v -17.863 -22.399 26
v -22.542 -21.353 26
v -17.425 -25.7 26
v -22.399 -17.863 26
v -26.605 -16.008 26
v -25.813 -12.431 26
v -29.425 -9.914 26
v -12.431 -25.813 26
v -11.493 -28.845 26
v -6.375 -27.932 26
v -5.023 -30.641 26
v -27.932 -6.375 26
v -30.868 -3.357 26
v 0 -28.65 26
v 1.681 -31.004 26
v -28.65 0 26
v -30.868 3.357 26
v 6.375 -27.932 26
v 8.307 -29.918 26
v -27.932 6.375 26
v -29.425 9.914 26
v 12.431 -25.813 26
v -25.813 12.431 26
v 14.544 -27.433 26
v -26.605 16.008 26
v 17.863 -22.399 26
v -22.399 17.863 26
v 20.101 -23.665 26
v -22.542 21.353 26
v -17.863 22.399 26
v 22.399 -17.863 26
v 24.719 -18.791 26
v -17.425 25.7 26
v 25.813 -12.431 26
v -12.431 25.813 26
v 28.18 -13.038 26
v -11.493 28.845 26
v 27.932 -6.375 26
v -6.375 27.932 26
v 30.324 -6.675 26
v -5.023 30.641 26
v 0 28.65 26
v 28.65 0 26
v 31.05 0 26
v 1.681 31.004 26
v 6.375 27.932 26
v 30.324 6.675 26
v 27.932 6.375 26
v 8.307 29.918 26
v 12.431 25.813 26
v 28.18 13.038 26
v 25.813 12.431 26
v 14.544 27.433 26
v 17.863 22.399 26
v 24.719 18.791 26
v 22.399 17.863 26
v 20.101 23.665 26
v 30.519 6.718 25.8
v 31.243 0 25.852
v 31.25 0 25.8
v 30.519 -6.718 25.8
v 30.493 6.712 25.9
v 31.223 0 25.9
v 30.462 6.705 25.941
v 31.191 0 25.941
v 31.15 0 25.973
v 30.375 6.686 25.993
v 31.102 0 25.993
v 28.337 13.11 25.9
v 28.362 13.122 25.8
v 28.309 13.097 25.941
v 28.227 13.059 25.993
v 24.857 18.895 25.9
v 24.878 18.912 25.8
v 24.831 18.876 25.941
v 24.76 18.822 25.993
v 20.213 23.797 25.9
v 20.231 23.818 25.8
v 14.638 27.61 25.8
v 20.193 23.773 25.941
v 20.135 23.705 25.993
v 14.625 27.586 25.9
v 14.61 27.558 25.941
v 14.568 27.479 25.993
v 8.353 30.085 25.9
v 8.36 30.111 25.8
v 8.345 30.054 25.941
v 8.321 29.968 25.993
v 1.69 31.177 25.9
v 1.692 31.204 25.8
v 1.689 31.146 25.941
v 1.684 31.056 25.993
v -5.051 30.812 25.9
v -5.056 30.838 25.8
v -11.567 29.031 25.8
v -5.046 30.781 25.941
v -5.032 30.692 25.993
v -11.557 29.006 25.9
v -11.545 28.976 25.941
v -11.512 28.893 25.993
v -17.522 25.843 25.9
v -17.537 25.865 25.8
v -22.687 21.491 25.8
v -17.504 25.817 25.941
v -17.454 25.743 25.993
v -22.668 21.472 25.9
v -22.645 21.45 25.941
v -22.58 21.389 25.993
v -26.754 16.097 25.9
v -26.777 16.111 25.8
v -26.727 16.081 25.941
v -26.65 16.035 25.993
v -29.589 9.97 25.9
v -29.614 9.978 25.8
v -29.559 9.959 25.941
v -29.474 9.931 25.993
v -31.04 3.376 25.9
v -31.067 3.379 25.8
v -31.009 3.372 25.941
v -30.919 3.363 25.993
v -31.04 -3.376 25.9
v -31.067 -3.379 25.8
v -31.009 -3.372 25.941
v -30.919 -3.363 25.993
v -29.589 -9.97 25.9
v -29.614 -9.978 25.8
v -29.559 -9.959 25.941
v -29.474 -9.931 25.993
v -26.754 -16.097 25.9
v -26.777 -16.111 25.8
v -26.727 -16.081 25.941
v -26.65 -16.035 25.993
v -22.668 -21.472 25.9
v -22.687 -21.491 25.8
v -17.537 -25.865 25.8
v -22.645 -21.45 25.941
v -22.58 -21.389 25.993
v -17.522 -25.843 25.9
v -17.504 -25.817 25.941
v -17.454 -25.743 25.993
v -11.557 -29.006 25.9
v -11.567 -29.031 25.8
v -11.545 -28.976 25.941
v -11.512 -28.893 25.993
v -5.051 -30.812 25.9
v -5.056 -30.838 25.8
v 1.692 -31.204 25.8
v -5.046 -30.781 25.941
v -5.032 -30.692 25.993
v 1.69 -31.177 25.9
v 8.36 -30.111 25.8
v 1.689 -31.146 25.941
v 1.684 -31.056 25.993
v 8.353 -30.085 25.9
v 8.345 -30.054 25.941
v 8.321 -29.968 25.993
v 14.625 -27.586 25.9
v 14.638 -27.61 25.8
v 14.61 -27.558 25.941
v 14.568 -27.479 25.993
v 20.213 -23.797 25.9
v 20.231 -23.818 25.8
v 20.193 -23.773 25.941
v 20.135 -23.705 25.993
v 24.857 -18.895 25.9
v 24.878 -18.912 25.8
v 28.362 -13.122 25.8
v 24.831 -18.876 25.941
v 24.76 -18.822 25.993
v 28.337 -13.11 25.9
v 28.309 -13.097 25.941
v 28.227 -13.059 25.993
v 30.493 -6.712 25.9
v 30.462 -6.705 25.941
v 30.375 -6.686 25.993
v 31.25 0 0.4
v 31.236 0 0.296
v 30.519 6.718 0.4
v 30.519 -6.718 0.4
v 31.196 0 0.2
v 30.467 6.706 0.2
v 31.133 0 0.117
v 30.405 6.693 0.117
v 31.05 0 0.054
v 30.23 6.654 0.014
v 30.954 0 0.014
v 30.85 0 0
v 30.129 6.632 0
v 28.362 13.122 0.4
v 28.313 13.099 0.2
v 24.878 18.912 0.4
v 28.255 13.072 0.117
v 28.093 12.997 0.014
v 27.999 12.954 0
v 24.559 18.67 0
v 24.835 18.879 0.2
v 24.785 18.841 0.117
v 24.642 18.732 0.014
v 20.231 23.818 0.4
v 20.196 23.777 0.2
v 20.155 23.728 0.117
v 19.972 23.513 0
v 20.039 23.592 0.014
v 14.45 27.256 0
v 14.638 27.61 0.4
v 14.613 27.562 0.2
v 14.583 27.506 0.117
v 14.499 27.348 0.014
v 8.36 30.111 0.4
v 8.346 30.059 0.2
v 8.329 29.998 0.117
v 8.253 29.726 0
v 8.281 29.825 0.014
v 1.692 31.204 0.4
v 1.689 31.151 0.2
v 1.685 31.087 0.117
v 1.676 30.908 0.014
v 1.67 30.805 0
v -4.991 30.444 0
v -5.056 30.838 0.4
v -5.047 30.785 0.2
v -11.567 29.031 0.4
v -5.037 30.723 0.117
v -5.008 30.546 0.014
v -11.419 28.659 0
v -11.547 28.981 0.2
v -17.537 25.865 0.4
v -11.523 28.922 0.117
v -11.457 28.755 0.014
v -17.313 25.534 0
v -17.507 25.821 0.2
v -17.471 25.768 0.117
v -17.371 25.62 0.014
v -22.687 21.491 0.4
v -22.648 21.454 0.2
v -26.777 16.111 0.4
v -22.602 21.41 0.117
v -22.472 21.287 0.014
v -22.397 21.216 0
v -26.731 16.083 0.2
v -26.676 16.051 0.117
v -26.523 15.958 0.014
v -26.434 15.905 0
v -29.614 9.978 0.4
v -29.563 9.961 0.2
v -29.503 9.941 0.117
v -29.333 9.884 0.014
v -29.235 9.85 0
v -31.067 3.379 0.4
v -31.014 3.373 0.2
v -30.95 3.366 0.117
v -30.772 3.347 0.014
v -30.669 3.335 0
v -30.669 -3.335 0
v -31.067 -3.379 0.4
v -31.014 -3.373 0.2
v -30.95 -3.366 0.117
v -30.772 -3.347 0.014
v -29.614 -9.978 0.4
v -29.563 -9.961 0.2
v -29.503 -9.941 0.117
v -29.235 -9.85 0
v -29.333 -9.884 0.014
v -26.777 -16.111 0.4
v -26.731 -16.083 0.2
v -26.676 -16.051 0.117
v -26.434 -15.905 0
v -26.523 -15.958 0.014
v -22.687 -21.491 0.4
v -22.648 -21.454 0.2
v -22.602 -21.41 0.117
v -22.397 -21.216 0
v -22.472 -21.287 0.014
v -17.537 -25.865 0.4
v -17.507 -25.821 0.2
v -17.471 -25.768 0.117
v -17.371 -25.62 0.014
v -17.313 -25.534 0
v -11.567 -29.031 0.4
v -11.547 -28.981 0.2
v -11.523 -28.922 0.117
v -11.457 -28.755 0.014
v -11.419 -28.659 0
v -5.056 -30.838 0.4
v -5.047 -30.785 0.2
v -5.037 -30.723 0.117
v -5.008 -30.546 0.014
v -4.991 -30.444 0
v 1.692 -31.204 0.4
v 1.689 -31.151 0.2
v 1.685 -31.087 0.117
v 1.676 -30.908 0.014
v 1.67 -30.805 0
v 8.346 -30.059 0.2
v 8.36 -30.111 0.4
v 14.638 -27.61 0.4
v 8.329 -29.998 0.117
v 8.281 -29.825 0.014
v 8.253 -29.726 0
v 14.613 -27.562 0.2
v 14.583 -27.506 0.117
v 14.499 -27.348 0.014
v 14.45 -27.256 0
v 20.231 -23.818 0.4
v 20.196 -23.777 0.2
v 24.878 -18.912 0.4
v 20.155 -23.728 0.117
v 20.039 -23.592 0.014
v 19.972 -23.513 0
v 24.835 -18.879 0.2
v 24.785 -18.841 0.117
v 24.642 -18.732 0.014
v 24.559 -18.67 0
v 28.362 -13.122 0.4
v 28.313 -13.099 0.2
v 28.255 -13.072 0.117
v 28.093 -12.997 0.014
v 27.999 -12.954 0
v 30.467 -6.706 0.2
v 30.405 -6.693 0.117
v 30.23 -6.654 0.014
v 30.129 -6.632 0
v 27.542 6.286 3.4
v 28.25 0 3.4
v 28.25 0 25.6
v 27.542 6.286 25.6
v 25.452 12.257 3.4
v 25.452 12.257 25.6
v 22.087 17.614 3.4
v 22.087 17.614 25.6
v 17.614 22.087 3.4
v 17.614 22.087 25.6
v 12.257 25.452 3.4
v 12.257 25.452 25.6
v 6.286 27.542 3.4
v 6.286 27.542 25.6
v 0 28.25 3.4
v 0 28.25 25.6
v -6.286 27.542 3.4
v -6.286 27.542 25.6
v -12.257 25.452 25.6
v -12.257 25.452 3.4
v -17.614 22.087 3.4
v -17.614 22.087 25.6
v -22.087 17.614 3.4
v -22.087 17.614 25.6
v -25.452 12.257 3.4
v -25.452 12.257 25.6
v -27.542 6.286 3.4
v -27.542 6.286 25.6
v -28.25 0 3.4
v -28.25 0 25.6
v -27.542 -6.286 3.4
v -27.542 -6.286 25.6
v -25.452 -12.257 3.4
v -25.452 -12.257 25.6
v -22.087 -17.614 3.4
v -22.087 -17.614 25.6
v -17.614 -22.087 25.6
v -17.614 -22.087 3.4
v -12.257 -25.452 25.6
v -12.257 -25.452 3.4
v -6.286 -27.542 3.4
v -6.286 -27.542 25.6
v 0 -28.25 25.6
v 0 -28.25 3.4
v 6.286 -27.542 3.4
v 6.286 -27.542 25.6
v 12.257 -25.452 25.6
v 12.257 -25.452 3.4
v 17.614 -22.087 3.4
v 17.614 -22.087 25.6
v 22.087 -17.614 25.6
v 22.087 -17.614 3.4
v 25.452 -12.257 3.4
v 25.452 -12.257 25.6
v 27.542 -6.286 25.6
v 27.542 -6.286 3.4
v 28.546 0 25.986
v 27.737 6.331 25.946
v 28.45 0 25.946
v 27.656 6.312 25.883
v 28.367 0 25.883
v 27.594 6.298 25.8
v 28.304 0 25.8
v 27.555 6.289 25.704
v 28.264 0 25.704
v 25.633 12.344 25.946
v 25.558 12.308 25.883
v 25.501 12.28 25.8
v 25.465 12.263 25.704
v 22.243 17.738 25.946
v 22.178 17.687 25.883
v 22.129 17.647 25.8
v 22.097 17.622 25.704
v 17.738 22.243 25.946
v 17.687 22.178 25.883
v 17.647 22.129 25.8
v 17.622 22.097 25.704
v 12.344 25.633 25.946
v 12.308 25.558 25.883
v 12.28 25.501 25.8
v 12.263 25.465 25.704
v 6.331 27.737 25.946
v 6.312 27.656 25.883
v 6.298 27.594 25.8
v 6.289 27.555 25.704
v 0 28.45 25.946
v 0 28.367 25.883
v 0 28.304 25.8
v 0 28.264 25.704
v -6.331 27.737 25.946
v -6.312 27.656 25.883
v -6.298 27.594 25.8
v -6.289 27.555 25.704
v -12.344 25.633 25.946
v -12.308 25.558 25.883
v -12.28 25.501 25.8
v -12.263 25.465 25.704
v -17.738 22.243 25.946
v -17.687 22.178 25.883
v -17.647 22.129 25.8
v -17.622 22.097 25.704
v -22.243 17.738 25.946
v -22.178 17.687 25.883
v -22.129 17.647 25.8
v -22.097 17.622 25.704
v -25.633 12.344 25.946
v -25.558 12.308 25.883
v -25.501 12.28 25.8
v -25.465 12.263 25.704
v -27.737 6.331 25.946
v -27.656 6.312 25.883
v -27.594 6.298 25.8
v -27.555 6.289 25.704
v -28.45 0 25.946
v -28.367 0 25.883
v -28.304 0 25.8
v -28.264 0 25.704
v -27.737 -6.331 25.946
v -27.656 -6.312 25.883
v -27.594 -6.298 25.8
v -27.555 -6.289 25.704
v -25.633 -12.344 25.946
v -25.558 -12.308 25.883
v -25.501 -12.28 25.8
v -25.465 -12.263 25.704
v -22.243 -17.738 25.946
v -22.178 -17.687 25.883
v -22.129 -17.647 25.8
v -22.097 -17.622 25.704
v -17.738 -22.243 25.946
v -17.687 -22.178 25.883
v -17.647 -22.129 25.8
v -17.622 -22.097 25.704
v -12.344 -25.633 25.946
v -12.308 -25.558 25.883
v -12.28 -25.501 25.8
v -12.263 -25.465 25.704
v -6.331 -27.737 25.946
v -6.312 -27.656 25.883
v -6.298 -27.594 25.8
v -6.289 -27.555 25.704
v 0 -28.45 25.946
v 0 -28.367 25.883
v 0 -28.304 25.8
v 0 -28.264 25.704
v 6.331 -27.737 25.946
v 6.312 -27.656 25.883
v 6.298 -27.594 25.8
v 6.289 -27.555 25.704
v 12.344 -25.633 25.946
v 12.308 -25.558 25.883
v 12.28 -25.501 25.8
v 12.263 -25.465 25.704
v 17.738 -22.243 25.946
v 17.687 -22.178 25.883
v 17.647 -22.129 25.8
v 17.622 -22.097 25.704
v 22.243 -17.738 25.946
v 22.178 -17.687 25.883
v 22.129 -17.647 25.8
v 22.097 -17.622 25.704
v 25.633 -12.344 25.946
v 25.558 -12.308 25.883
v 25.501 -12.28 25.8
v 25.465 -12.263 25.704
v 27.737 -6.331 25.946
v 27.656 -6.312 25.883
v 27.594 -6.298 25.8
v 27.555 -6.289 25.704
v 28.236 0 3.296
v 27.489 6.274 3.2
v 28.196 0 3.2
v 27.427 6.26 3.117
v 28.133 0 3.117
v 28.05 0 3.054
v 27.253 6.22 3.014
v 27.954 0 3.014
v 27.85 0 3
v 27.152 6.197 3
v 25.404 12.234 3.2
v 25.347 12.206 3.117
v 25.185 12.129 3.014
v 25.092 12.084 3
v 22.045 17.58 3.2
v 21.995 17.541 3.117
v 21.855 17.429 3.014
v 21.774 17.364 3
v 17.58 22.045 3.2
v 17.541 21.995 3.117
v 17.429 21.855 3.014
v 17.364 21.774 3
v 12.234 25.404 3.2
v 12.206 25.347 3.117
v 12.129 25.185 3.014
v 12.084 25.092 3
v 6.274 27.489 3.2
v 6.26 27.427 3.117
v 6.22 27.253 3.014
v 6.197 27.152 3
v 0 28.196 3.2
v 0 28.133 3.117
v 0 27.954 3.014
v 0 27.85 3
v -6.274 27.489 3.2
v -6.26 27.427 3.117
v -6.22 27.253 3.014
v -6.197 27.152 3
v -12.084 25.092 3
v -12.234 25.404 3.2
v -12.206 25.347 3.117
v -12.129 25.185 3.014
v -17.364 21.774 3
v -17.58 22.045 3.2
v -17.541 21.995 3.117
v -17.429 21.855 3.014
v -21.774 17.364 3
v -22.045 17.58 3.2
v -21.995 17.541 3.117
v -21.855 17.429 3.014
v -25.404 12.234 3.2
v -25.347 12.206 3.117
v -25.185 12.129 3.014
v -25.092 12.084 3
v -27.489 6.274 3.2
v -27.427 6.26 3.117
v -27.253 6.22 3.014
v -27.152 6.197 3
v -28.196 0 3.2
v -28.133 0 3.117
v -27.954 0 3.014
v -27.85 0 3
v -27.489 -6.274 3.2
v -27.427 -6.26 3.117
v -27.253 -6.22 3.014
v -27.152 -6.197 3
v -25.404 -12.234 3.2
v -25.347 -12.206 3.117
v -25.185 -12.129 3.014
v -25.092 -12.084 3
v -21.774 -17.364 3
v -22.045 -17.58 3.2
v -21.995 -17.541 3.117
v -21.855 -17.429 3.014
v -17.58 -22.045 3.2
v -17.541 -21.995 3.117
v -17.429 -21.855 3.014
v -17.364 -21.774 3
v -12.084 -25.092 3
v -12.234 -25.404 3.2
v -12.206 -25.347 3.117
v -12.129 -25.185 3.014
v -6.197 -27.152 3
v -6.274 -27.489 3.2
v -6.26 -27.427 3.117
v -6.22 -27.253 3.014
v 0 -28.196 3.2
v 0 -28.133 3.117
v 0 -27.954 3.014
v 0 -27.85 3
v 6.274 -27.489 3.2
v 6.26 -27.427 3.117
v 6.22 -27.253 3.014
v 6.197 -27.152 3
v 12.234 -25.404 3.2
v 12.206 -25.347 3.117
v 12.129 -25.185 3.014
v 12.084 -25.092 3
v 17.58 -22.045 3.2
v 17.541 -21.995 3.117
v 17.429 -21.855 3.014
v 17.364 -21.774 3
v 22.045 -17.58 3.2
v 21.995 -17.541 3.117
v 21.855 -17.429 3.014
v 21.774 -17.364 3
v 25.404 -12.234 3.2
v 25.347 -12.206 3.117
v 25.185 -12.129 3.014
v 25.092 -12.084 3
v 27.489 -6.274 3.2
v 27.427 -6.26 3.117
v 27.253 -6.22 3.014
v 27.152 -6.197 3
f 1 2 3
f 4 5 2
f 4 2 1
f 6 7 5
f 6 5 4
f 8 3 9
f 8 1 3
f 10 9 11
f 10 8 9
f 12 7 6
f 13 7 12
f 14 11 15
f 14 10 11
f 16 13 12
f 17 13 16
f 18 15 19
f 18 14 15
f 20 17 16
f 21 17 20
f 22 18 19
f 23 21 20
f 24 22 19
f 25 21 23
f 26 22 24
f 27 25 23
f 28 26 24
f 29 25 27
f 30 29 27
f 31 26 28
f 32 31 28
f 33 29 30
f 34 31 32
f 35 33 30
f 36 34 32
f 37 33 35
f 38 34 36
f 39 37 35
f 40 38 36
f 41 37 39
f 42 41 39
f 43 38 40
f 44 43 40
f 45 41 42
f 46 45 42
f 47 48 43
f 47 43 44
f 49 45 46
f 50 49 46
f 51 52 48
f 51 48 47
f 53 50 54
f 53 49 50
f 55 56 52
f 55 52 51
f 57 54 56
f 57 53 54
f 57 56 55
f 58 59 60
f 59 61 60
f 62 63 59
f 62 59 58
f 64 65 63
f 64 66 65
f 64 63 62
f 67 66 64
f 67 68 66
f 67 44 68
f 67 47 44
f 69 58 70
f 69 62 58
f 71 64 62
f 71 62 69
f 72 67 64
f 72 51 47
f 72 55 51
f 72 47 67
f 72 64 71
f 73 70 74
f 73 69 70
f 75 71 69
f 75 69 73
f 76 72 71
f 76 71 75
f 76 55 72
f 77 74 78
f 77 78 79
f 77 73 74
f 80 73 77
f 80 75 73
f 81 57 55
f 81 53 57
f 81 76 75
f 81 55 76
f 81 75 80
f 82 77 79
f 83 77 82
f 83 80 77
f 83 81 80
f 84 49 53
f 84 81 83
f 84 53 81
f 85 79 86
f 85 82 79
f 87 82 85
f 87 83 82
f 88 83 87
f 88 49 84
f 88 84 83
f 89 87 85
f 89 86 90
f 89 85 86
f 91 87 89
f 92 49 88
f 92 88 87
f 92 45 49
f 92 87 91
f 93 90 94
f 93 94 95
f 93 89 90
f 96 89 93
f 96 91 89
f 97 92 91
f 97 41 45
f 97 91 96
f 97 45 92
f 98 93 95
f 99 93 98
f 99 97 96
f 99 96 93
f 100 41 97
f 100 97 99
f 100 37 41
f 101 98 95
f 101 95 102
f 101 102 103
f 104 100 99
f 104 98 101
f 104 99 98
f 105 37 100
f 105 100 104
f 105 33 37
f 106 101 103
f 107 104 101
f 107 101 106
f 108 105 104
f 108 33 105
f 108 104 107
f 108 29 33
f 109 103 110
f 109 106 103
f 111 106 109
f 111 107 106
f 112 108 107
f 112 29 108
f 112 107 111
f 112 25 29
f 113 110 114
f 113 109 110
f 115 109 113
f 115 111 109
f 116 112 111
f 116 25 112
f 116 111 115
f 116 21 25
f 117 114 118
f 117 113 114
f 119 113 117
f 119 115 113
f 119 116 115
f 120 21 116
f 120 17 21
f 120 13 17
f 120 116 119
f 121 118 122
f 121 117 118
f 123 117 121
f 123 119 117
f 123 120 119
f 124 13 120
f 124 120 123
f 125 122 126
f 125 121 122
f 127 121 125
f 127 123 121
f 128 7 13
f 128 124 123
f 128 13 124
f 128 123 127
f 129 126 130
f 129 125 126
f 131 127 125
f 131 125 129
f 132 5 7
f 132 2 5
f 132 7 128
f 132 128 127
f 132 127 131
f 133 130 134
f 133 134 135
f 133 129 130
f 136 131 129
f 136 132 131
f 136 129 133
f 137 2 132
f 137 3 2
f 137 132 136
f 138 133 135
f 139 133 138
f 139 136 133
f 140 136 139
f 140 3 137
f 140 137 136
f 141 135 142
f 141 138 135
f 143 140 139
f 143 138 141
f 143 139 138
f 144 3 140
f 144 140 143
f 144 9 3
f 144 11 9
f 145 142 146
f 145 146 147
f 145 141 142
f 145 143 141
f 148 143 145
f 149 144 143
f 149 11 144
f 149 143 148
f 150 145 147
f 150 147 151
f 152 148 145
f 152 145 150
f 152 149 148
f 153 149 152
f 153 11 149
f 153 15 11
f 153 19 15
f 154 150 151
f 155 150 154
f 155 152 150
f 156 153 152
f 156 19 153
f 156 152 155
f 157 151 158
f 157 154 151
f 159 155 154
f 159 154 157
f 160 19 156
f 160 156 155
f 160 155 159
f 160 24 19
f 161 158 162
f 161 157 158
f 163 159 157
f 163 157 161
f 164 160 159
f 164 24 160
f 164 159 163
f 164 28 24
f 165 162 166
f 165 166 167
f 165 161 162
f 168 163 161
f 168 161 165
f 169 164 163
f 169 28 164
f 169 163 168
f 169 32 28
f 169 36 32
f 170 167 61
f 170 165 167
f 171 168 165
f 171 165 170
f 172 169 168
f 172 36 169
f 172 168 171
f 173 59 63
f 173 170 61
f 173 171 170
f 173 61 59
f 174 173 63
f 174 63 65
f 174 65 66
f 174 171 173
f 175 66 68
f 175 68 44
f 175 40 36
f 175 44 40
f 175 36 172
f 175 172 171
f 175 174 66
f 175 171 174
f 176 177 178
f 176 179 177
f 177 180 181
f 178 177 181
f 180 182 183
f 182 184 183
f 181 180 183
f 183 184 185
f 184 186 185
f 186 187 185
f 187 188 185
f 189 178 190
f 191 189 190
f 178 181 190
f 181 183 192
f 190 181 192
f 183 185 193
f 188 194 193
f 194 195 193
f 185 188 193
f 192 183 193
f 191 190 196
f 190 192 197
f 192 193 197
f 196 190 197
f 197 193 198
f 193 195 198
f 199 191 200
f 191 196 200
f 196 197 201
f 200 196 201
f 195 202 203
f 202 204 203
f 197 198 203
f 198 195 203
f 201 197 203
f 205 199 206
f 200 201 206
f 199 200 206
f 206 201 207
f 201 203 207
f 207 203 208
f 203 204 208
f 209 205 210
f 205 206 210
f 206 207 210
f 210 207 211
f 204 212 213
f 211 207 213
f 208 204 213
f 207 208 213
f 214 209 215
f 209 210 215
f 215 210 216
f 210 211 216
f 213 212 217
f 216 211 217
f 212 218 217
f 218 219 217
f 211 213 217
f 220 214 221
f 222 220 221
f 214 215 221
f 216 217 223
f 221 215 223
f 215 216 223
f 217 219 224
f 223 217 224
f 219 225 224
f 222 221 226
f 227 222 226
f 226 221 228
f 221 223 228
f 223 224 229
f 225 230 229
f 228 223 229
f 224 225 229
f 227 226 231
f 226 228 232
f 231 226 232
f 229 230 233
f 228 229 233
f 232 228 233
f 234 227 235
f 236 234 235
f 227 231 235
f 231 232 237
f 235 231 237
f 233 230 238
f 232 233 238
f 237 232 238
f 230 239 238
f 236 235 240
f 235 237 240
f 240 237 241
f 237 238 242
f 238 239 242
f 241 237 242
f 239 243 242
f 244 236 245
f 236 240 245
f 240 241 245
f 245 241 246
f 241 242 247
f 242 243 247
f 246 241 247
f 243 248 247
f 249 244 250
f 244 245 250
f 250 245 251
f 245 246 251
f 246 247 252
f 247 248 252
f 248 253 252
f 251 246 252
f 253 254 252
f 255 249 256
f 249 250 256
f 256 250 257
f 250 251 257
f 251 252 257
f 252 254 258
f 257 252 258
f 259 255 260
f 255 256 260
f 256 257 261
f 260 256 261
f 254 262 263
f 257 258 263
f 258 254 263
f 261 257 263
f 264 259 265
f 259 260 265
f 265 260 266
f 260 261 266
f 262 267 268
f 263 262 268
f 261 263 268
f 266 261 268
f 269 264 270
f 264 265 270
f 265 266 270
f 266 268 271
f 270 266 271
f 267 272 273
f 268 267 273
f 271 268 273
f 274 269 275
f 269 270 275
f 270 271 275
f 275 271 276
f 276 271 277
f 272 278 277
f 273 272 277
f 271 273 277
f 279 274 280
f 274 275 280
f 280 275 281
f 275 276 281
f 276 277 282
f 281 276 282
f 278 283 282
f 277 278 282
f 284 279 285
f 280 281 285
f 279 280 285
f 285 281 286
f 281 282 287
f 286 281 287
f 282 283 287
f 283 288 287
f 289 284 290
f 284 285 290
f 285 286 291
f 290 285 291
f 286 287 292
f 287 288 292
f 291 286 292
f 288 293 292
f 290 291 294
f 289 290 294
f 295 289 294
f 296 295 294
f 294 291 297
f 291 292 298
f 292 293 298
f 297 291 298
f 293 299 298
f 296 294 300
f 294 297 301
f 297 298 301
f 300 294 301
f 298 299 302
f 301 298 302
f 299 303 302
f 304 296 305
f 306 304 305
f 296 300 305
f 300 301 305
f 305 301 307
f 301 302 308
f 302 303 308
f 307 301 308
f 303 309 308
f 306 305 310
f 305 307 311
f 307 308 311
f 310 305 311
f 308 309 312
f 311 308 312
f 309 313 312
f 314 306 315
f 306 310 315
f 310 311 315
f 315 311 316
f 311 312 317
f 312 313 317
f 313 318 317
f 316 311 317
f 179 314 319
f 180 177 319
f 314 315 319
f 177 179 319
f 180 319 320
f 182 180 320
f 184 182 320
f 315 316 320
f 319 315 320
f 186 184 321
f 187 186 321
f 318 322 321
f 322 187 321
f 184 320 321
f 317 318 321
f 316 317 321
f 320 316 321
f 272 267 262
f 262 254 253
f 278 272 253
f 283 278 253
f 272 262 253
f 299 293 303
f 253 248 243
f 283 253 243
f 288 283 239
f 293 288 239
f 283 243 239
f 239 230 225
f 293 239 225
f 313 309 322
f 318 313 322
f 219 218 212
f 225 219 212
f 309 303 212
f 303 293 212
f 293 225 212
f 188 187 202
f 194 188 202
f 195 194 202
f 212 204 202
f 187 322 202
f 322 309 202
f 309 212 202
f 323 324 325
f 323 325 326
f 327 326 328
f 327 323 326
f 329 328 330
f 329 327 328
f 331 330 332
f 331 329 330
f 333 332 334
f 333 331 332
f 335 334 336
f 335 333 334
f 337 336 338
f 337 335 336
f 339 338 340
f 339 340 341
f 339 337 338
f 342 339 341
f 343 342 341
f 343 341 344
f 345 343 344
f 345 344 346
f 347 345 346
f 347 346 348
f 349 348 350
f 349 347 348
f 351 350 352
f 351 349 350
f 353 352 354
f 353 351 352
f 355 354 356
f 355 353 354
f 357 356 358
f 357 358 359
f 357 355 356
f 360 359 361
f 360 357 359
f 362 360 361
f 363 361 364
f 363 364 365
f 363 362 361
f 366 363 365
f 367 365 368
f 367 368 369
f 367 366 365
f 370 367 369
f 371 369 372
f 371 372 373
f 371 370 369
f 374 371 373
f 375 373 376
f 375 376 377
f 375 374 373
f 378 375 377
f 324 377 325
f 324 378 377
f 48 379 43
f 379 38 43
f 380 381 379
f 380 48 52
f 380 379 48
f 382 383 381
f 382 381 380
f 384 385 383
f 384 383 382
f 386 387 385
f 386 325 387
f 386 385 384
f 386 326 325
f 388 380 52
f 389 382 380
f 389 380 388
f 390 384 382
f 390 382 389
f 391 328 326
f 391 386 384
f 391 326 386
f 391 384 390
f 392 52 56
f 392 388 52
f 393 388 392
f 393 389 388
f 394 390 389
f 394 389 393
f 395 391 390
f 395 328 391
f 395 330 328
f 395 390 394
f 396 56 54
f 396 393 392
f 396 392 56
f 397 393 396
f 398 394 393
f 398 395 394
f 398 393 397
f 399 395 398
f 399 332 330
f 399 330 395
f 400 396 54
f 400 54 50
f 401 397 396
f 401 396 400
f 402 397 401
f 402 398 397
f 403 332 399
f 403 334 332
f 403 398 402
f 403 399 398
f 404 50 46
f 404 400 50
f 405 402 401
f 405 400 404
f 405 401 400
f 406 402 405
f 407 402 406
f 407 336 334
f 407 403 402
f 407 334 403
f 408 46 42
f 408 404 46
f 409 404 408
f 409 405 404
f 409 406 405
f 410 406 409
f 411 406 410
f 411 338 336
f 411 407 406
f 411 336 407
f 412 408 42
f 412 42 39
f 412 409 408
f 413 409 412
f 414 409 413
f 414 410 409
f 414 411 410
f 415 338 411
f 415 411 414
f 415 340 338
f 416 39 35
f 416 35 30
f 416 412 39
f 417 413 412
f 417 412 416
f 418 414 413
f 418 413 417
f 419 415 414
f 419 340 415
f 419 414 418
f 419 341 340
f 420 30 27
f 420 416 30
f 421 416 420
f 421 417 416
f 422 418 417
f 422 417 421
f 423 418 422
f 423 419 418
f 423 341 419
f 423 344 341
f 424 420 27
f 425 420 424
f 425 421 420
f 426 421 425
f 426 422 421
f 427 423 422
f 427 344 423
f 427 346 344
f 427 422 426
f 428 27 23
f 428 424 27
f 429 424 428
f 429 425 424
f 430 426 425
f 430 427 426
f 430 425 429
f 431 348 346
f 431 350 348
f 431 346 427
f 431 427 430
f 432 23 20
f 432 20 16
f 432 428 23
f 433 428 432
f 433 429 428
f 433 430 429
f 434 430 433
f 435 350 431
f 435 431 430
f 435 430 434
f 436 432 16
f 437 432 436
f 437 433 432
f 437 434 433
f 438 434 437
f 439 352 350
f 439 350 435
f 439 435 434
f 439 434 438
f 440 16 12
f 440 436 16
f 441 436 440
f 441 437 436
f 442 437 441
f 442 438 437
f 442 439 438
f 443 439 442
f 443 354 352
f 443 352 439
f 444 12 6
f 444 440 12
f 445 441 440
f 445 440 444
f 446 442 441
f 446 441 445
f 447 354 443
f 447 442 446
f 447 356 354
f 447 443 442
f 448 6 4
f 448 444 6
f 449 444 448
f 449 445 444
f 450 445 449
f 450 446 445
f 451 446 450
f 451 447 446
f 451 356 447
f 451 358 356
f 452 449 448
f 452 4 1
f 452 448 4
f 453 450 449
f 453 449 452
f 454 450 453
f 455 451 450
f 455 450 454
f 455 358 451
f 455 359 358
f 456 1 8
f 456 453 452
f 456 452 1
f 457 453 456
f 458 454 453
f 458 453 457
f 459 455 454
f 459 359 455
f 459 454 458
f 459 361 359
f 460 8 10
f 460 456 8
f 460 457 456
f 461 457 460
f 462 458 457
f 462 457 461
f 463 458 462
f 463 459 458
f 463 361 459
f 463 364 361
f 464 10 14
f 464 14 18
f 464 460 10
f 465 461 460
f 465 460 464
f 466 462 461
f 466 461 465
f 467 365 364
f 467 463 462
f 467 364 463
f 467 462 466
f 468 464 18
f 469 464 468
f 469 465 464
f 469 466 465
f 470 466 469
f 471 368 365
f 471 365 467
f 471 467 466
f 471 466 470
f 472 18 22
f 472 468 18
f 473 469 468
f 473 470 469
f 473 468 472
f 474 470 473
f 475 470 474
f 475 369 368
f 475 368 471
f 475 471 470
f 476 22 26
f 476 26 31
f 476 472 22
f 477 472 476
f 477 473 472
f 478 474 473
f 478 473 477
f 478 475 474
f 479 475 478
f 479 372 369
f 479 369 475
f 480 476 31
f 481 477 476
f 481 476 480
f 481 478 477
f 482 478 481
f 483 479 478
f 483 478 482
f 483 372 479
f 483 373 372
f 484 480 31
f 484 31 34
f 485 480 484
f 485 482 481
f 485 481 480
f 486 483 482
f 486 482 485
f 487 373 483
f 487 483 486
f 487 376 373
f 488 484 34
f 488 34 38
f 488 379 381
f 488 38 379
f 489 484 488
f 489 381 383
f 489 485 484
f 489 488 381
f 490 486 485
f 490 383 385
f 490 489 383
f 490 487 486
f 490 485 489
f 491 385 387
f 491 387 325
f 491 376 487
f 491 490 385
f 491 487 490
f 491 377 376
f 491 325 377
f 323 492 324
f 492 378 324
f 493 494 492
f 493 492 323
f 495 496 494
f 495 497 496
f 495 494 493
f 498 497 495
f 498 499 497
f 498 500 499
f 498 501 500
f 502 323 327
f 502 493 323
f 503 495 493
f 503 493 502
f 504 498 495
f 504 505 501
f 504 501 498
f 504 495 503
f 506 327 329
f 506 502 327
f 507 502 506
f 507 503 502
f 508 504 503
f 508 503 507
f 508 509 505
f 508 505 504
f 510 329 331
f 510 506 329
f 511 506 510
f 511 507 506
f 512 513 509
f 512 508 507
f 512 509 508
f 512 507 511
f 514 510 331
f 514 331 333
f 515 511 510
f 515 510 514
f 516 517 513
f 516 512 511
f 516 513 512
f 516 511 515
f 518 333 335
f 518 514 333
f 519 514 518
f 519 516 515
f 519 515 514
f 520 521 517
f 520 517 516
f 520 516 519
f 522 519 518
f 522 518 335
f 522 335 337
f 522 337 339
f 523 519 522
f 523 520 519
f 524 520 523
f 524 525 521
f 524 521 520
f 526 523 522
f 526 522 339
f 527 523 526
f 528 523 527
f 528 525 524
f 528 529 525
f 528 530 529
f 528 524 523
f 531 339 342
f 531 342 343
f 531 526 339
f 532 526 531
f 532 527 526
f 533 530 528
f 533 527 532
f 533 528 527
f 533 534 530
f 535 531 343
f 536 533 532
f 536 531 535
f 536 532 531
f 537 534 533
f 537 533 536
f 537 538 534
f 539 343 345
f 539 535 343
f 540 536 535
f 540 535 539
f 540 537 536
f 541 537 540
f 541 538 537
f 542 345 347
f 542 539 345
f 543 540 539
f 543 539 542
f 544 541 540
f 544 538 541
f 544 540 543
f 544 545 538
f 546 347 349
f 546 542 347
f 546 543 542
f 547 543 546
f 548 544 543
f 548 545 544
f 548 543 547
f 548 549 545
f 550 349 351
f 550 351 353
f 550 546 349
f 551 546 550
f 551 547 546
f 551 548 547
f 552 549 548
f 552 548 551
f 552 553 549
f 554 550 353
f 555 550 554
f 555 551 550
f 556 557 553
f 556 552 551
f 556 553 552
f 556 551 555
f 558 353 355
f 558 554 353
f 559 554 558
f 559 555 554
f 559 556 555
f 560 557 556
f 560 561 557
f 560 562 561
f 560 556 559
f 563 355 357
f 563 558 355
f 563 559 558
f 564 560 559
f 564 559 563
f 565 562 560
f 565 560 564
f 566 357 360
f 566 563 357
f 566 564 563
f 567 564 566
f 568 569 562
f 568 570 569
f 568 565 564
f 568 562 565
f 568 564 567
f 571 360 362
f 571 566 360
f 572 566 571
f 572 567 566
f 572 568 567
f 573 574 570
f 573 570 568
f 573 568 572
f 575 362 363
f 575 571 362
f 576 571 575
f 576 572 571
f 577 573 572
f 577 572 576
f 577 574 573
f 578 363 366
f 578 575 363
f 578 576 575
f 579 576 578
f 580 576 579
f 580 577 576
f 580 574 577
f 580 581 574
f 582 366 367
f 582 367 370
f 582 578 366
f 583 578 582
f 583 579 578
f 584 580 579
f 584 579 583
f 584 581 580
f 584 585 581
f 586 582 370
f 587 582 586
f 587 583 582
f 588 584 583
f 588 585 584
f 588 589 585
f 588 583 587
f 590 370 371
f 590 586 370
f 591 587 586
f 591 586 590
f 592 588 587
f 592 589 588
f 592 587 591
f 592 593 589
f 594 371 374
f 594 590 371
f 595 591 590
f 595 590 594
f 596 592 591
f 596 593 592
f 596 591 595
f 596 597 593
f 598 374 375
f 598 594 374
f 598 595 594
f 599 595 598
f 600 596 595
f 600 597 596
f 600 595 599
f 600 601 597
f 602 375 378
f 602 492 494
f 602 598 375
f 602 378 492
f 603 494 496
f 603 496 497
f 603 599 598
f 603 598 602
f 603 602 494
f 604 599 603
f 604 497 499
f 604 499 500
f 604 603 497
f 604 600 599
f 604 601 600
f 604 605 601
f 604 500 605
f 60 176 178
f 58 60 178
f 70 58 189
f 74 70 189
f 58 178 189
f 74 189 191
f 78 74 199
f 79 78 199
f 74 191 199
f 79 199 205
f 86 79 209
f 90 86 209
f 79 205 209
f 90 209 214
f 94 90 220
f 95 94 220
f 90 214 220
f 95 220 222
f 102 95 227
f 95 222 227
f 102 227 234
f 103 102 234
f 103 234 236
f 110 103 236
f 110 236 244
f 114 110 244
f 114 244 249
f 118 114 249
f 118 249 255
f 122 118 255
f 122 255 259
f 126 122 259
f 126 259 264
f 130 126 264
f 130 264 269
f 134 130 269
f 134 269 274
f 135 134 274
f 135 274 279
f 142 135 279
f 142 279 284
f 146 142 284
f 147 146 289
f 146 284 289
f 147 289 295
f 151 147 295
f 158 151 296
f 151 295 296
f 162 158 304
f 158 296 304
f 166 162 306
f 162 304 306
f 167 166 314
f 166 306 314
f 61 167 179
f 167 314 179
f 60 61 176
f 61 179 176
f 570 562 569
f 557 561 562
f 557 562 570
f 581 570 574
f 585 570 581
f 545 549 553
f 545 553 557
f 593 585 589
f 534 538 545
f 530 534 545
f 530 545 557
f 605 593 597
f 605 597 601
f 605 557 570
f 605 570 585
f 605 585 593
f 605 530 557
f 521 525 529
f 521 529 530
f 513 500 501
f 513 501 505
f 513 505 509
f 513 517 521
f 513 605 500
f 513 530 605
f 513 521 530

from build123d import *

# Parameters (mm, degrees)
F0_R     = 31.25
F1_DEPTH = 3
F2_R     = 31.25
F2_R_2   = 28.25
F3_DEPTH = 23
F4_R     = 0.4
F5_R     = 0.2


with BuildPart() as f1:
    # F0 (on Top) → F1 (new body)
    with BuildSketch(Plane.XY):
        Circle(F0_R)
    extrude(amount=F1_DEPTH)

    # F2 (on face) → F3 (join)
    with BuildSketch(Plane.XY.offset(3)):
        Circle(F2_R)
        Circle(F2_R_2, mode=Mode.SUBTRACT)
    extrude(amount=F3_DEPTH)

    # F4
    f4_edges = [f1.edges().sort_by_distance(p)[0] for p in [
        (-28.25, 0, 26),
        (-28.25, 0, 3),
        (-31.25, 0, 0),
    ]]
    fillet(f4_edges, radius=F4_R)

    # F5
    f5_edges = [f1.edges().sort_by_distance(p)[0] for p in [
        (-31.25, 0, 26),
    ]]
    fillet(f5_edges, radius=F5_R)


solid = f1.part
